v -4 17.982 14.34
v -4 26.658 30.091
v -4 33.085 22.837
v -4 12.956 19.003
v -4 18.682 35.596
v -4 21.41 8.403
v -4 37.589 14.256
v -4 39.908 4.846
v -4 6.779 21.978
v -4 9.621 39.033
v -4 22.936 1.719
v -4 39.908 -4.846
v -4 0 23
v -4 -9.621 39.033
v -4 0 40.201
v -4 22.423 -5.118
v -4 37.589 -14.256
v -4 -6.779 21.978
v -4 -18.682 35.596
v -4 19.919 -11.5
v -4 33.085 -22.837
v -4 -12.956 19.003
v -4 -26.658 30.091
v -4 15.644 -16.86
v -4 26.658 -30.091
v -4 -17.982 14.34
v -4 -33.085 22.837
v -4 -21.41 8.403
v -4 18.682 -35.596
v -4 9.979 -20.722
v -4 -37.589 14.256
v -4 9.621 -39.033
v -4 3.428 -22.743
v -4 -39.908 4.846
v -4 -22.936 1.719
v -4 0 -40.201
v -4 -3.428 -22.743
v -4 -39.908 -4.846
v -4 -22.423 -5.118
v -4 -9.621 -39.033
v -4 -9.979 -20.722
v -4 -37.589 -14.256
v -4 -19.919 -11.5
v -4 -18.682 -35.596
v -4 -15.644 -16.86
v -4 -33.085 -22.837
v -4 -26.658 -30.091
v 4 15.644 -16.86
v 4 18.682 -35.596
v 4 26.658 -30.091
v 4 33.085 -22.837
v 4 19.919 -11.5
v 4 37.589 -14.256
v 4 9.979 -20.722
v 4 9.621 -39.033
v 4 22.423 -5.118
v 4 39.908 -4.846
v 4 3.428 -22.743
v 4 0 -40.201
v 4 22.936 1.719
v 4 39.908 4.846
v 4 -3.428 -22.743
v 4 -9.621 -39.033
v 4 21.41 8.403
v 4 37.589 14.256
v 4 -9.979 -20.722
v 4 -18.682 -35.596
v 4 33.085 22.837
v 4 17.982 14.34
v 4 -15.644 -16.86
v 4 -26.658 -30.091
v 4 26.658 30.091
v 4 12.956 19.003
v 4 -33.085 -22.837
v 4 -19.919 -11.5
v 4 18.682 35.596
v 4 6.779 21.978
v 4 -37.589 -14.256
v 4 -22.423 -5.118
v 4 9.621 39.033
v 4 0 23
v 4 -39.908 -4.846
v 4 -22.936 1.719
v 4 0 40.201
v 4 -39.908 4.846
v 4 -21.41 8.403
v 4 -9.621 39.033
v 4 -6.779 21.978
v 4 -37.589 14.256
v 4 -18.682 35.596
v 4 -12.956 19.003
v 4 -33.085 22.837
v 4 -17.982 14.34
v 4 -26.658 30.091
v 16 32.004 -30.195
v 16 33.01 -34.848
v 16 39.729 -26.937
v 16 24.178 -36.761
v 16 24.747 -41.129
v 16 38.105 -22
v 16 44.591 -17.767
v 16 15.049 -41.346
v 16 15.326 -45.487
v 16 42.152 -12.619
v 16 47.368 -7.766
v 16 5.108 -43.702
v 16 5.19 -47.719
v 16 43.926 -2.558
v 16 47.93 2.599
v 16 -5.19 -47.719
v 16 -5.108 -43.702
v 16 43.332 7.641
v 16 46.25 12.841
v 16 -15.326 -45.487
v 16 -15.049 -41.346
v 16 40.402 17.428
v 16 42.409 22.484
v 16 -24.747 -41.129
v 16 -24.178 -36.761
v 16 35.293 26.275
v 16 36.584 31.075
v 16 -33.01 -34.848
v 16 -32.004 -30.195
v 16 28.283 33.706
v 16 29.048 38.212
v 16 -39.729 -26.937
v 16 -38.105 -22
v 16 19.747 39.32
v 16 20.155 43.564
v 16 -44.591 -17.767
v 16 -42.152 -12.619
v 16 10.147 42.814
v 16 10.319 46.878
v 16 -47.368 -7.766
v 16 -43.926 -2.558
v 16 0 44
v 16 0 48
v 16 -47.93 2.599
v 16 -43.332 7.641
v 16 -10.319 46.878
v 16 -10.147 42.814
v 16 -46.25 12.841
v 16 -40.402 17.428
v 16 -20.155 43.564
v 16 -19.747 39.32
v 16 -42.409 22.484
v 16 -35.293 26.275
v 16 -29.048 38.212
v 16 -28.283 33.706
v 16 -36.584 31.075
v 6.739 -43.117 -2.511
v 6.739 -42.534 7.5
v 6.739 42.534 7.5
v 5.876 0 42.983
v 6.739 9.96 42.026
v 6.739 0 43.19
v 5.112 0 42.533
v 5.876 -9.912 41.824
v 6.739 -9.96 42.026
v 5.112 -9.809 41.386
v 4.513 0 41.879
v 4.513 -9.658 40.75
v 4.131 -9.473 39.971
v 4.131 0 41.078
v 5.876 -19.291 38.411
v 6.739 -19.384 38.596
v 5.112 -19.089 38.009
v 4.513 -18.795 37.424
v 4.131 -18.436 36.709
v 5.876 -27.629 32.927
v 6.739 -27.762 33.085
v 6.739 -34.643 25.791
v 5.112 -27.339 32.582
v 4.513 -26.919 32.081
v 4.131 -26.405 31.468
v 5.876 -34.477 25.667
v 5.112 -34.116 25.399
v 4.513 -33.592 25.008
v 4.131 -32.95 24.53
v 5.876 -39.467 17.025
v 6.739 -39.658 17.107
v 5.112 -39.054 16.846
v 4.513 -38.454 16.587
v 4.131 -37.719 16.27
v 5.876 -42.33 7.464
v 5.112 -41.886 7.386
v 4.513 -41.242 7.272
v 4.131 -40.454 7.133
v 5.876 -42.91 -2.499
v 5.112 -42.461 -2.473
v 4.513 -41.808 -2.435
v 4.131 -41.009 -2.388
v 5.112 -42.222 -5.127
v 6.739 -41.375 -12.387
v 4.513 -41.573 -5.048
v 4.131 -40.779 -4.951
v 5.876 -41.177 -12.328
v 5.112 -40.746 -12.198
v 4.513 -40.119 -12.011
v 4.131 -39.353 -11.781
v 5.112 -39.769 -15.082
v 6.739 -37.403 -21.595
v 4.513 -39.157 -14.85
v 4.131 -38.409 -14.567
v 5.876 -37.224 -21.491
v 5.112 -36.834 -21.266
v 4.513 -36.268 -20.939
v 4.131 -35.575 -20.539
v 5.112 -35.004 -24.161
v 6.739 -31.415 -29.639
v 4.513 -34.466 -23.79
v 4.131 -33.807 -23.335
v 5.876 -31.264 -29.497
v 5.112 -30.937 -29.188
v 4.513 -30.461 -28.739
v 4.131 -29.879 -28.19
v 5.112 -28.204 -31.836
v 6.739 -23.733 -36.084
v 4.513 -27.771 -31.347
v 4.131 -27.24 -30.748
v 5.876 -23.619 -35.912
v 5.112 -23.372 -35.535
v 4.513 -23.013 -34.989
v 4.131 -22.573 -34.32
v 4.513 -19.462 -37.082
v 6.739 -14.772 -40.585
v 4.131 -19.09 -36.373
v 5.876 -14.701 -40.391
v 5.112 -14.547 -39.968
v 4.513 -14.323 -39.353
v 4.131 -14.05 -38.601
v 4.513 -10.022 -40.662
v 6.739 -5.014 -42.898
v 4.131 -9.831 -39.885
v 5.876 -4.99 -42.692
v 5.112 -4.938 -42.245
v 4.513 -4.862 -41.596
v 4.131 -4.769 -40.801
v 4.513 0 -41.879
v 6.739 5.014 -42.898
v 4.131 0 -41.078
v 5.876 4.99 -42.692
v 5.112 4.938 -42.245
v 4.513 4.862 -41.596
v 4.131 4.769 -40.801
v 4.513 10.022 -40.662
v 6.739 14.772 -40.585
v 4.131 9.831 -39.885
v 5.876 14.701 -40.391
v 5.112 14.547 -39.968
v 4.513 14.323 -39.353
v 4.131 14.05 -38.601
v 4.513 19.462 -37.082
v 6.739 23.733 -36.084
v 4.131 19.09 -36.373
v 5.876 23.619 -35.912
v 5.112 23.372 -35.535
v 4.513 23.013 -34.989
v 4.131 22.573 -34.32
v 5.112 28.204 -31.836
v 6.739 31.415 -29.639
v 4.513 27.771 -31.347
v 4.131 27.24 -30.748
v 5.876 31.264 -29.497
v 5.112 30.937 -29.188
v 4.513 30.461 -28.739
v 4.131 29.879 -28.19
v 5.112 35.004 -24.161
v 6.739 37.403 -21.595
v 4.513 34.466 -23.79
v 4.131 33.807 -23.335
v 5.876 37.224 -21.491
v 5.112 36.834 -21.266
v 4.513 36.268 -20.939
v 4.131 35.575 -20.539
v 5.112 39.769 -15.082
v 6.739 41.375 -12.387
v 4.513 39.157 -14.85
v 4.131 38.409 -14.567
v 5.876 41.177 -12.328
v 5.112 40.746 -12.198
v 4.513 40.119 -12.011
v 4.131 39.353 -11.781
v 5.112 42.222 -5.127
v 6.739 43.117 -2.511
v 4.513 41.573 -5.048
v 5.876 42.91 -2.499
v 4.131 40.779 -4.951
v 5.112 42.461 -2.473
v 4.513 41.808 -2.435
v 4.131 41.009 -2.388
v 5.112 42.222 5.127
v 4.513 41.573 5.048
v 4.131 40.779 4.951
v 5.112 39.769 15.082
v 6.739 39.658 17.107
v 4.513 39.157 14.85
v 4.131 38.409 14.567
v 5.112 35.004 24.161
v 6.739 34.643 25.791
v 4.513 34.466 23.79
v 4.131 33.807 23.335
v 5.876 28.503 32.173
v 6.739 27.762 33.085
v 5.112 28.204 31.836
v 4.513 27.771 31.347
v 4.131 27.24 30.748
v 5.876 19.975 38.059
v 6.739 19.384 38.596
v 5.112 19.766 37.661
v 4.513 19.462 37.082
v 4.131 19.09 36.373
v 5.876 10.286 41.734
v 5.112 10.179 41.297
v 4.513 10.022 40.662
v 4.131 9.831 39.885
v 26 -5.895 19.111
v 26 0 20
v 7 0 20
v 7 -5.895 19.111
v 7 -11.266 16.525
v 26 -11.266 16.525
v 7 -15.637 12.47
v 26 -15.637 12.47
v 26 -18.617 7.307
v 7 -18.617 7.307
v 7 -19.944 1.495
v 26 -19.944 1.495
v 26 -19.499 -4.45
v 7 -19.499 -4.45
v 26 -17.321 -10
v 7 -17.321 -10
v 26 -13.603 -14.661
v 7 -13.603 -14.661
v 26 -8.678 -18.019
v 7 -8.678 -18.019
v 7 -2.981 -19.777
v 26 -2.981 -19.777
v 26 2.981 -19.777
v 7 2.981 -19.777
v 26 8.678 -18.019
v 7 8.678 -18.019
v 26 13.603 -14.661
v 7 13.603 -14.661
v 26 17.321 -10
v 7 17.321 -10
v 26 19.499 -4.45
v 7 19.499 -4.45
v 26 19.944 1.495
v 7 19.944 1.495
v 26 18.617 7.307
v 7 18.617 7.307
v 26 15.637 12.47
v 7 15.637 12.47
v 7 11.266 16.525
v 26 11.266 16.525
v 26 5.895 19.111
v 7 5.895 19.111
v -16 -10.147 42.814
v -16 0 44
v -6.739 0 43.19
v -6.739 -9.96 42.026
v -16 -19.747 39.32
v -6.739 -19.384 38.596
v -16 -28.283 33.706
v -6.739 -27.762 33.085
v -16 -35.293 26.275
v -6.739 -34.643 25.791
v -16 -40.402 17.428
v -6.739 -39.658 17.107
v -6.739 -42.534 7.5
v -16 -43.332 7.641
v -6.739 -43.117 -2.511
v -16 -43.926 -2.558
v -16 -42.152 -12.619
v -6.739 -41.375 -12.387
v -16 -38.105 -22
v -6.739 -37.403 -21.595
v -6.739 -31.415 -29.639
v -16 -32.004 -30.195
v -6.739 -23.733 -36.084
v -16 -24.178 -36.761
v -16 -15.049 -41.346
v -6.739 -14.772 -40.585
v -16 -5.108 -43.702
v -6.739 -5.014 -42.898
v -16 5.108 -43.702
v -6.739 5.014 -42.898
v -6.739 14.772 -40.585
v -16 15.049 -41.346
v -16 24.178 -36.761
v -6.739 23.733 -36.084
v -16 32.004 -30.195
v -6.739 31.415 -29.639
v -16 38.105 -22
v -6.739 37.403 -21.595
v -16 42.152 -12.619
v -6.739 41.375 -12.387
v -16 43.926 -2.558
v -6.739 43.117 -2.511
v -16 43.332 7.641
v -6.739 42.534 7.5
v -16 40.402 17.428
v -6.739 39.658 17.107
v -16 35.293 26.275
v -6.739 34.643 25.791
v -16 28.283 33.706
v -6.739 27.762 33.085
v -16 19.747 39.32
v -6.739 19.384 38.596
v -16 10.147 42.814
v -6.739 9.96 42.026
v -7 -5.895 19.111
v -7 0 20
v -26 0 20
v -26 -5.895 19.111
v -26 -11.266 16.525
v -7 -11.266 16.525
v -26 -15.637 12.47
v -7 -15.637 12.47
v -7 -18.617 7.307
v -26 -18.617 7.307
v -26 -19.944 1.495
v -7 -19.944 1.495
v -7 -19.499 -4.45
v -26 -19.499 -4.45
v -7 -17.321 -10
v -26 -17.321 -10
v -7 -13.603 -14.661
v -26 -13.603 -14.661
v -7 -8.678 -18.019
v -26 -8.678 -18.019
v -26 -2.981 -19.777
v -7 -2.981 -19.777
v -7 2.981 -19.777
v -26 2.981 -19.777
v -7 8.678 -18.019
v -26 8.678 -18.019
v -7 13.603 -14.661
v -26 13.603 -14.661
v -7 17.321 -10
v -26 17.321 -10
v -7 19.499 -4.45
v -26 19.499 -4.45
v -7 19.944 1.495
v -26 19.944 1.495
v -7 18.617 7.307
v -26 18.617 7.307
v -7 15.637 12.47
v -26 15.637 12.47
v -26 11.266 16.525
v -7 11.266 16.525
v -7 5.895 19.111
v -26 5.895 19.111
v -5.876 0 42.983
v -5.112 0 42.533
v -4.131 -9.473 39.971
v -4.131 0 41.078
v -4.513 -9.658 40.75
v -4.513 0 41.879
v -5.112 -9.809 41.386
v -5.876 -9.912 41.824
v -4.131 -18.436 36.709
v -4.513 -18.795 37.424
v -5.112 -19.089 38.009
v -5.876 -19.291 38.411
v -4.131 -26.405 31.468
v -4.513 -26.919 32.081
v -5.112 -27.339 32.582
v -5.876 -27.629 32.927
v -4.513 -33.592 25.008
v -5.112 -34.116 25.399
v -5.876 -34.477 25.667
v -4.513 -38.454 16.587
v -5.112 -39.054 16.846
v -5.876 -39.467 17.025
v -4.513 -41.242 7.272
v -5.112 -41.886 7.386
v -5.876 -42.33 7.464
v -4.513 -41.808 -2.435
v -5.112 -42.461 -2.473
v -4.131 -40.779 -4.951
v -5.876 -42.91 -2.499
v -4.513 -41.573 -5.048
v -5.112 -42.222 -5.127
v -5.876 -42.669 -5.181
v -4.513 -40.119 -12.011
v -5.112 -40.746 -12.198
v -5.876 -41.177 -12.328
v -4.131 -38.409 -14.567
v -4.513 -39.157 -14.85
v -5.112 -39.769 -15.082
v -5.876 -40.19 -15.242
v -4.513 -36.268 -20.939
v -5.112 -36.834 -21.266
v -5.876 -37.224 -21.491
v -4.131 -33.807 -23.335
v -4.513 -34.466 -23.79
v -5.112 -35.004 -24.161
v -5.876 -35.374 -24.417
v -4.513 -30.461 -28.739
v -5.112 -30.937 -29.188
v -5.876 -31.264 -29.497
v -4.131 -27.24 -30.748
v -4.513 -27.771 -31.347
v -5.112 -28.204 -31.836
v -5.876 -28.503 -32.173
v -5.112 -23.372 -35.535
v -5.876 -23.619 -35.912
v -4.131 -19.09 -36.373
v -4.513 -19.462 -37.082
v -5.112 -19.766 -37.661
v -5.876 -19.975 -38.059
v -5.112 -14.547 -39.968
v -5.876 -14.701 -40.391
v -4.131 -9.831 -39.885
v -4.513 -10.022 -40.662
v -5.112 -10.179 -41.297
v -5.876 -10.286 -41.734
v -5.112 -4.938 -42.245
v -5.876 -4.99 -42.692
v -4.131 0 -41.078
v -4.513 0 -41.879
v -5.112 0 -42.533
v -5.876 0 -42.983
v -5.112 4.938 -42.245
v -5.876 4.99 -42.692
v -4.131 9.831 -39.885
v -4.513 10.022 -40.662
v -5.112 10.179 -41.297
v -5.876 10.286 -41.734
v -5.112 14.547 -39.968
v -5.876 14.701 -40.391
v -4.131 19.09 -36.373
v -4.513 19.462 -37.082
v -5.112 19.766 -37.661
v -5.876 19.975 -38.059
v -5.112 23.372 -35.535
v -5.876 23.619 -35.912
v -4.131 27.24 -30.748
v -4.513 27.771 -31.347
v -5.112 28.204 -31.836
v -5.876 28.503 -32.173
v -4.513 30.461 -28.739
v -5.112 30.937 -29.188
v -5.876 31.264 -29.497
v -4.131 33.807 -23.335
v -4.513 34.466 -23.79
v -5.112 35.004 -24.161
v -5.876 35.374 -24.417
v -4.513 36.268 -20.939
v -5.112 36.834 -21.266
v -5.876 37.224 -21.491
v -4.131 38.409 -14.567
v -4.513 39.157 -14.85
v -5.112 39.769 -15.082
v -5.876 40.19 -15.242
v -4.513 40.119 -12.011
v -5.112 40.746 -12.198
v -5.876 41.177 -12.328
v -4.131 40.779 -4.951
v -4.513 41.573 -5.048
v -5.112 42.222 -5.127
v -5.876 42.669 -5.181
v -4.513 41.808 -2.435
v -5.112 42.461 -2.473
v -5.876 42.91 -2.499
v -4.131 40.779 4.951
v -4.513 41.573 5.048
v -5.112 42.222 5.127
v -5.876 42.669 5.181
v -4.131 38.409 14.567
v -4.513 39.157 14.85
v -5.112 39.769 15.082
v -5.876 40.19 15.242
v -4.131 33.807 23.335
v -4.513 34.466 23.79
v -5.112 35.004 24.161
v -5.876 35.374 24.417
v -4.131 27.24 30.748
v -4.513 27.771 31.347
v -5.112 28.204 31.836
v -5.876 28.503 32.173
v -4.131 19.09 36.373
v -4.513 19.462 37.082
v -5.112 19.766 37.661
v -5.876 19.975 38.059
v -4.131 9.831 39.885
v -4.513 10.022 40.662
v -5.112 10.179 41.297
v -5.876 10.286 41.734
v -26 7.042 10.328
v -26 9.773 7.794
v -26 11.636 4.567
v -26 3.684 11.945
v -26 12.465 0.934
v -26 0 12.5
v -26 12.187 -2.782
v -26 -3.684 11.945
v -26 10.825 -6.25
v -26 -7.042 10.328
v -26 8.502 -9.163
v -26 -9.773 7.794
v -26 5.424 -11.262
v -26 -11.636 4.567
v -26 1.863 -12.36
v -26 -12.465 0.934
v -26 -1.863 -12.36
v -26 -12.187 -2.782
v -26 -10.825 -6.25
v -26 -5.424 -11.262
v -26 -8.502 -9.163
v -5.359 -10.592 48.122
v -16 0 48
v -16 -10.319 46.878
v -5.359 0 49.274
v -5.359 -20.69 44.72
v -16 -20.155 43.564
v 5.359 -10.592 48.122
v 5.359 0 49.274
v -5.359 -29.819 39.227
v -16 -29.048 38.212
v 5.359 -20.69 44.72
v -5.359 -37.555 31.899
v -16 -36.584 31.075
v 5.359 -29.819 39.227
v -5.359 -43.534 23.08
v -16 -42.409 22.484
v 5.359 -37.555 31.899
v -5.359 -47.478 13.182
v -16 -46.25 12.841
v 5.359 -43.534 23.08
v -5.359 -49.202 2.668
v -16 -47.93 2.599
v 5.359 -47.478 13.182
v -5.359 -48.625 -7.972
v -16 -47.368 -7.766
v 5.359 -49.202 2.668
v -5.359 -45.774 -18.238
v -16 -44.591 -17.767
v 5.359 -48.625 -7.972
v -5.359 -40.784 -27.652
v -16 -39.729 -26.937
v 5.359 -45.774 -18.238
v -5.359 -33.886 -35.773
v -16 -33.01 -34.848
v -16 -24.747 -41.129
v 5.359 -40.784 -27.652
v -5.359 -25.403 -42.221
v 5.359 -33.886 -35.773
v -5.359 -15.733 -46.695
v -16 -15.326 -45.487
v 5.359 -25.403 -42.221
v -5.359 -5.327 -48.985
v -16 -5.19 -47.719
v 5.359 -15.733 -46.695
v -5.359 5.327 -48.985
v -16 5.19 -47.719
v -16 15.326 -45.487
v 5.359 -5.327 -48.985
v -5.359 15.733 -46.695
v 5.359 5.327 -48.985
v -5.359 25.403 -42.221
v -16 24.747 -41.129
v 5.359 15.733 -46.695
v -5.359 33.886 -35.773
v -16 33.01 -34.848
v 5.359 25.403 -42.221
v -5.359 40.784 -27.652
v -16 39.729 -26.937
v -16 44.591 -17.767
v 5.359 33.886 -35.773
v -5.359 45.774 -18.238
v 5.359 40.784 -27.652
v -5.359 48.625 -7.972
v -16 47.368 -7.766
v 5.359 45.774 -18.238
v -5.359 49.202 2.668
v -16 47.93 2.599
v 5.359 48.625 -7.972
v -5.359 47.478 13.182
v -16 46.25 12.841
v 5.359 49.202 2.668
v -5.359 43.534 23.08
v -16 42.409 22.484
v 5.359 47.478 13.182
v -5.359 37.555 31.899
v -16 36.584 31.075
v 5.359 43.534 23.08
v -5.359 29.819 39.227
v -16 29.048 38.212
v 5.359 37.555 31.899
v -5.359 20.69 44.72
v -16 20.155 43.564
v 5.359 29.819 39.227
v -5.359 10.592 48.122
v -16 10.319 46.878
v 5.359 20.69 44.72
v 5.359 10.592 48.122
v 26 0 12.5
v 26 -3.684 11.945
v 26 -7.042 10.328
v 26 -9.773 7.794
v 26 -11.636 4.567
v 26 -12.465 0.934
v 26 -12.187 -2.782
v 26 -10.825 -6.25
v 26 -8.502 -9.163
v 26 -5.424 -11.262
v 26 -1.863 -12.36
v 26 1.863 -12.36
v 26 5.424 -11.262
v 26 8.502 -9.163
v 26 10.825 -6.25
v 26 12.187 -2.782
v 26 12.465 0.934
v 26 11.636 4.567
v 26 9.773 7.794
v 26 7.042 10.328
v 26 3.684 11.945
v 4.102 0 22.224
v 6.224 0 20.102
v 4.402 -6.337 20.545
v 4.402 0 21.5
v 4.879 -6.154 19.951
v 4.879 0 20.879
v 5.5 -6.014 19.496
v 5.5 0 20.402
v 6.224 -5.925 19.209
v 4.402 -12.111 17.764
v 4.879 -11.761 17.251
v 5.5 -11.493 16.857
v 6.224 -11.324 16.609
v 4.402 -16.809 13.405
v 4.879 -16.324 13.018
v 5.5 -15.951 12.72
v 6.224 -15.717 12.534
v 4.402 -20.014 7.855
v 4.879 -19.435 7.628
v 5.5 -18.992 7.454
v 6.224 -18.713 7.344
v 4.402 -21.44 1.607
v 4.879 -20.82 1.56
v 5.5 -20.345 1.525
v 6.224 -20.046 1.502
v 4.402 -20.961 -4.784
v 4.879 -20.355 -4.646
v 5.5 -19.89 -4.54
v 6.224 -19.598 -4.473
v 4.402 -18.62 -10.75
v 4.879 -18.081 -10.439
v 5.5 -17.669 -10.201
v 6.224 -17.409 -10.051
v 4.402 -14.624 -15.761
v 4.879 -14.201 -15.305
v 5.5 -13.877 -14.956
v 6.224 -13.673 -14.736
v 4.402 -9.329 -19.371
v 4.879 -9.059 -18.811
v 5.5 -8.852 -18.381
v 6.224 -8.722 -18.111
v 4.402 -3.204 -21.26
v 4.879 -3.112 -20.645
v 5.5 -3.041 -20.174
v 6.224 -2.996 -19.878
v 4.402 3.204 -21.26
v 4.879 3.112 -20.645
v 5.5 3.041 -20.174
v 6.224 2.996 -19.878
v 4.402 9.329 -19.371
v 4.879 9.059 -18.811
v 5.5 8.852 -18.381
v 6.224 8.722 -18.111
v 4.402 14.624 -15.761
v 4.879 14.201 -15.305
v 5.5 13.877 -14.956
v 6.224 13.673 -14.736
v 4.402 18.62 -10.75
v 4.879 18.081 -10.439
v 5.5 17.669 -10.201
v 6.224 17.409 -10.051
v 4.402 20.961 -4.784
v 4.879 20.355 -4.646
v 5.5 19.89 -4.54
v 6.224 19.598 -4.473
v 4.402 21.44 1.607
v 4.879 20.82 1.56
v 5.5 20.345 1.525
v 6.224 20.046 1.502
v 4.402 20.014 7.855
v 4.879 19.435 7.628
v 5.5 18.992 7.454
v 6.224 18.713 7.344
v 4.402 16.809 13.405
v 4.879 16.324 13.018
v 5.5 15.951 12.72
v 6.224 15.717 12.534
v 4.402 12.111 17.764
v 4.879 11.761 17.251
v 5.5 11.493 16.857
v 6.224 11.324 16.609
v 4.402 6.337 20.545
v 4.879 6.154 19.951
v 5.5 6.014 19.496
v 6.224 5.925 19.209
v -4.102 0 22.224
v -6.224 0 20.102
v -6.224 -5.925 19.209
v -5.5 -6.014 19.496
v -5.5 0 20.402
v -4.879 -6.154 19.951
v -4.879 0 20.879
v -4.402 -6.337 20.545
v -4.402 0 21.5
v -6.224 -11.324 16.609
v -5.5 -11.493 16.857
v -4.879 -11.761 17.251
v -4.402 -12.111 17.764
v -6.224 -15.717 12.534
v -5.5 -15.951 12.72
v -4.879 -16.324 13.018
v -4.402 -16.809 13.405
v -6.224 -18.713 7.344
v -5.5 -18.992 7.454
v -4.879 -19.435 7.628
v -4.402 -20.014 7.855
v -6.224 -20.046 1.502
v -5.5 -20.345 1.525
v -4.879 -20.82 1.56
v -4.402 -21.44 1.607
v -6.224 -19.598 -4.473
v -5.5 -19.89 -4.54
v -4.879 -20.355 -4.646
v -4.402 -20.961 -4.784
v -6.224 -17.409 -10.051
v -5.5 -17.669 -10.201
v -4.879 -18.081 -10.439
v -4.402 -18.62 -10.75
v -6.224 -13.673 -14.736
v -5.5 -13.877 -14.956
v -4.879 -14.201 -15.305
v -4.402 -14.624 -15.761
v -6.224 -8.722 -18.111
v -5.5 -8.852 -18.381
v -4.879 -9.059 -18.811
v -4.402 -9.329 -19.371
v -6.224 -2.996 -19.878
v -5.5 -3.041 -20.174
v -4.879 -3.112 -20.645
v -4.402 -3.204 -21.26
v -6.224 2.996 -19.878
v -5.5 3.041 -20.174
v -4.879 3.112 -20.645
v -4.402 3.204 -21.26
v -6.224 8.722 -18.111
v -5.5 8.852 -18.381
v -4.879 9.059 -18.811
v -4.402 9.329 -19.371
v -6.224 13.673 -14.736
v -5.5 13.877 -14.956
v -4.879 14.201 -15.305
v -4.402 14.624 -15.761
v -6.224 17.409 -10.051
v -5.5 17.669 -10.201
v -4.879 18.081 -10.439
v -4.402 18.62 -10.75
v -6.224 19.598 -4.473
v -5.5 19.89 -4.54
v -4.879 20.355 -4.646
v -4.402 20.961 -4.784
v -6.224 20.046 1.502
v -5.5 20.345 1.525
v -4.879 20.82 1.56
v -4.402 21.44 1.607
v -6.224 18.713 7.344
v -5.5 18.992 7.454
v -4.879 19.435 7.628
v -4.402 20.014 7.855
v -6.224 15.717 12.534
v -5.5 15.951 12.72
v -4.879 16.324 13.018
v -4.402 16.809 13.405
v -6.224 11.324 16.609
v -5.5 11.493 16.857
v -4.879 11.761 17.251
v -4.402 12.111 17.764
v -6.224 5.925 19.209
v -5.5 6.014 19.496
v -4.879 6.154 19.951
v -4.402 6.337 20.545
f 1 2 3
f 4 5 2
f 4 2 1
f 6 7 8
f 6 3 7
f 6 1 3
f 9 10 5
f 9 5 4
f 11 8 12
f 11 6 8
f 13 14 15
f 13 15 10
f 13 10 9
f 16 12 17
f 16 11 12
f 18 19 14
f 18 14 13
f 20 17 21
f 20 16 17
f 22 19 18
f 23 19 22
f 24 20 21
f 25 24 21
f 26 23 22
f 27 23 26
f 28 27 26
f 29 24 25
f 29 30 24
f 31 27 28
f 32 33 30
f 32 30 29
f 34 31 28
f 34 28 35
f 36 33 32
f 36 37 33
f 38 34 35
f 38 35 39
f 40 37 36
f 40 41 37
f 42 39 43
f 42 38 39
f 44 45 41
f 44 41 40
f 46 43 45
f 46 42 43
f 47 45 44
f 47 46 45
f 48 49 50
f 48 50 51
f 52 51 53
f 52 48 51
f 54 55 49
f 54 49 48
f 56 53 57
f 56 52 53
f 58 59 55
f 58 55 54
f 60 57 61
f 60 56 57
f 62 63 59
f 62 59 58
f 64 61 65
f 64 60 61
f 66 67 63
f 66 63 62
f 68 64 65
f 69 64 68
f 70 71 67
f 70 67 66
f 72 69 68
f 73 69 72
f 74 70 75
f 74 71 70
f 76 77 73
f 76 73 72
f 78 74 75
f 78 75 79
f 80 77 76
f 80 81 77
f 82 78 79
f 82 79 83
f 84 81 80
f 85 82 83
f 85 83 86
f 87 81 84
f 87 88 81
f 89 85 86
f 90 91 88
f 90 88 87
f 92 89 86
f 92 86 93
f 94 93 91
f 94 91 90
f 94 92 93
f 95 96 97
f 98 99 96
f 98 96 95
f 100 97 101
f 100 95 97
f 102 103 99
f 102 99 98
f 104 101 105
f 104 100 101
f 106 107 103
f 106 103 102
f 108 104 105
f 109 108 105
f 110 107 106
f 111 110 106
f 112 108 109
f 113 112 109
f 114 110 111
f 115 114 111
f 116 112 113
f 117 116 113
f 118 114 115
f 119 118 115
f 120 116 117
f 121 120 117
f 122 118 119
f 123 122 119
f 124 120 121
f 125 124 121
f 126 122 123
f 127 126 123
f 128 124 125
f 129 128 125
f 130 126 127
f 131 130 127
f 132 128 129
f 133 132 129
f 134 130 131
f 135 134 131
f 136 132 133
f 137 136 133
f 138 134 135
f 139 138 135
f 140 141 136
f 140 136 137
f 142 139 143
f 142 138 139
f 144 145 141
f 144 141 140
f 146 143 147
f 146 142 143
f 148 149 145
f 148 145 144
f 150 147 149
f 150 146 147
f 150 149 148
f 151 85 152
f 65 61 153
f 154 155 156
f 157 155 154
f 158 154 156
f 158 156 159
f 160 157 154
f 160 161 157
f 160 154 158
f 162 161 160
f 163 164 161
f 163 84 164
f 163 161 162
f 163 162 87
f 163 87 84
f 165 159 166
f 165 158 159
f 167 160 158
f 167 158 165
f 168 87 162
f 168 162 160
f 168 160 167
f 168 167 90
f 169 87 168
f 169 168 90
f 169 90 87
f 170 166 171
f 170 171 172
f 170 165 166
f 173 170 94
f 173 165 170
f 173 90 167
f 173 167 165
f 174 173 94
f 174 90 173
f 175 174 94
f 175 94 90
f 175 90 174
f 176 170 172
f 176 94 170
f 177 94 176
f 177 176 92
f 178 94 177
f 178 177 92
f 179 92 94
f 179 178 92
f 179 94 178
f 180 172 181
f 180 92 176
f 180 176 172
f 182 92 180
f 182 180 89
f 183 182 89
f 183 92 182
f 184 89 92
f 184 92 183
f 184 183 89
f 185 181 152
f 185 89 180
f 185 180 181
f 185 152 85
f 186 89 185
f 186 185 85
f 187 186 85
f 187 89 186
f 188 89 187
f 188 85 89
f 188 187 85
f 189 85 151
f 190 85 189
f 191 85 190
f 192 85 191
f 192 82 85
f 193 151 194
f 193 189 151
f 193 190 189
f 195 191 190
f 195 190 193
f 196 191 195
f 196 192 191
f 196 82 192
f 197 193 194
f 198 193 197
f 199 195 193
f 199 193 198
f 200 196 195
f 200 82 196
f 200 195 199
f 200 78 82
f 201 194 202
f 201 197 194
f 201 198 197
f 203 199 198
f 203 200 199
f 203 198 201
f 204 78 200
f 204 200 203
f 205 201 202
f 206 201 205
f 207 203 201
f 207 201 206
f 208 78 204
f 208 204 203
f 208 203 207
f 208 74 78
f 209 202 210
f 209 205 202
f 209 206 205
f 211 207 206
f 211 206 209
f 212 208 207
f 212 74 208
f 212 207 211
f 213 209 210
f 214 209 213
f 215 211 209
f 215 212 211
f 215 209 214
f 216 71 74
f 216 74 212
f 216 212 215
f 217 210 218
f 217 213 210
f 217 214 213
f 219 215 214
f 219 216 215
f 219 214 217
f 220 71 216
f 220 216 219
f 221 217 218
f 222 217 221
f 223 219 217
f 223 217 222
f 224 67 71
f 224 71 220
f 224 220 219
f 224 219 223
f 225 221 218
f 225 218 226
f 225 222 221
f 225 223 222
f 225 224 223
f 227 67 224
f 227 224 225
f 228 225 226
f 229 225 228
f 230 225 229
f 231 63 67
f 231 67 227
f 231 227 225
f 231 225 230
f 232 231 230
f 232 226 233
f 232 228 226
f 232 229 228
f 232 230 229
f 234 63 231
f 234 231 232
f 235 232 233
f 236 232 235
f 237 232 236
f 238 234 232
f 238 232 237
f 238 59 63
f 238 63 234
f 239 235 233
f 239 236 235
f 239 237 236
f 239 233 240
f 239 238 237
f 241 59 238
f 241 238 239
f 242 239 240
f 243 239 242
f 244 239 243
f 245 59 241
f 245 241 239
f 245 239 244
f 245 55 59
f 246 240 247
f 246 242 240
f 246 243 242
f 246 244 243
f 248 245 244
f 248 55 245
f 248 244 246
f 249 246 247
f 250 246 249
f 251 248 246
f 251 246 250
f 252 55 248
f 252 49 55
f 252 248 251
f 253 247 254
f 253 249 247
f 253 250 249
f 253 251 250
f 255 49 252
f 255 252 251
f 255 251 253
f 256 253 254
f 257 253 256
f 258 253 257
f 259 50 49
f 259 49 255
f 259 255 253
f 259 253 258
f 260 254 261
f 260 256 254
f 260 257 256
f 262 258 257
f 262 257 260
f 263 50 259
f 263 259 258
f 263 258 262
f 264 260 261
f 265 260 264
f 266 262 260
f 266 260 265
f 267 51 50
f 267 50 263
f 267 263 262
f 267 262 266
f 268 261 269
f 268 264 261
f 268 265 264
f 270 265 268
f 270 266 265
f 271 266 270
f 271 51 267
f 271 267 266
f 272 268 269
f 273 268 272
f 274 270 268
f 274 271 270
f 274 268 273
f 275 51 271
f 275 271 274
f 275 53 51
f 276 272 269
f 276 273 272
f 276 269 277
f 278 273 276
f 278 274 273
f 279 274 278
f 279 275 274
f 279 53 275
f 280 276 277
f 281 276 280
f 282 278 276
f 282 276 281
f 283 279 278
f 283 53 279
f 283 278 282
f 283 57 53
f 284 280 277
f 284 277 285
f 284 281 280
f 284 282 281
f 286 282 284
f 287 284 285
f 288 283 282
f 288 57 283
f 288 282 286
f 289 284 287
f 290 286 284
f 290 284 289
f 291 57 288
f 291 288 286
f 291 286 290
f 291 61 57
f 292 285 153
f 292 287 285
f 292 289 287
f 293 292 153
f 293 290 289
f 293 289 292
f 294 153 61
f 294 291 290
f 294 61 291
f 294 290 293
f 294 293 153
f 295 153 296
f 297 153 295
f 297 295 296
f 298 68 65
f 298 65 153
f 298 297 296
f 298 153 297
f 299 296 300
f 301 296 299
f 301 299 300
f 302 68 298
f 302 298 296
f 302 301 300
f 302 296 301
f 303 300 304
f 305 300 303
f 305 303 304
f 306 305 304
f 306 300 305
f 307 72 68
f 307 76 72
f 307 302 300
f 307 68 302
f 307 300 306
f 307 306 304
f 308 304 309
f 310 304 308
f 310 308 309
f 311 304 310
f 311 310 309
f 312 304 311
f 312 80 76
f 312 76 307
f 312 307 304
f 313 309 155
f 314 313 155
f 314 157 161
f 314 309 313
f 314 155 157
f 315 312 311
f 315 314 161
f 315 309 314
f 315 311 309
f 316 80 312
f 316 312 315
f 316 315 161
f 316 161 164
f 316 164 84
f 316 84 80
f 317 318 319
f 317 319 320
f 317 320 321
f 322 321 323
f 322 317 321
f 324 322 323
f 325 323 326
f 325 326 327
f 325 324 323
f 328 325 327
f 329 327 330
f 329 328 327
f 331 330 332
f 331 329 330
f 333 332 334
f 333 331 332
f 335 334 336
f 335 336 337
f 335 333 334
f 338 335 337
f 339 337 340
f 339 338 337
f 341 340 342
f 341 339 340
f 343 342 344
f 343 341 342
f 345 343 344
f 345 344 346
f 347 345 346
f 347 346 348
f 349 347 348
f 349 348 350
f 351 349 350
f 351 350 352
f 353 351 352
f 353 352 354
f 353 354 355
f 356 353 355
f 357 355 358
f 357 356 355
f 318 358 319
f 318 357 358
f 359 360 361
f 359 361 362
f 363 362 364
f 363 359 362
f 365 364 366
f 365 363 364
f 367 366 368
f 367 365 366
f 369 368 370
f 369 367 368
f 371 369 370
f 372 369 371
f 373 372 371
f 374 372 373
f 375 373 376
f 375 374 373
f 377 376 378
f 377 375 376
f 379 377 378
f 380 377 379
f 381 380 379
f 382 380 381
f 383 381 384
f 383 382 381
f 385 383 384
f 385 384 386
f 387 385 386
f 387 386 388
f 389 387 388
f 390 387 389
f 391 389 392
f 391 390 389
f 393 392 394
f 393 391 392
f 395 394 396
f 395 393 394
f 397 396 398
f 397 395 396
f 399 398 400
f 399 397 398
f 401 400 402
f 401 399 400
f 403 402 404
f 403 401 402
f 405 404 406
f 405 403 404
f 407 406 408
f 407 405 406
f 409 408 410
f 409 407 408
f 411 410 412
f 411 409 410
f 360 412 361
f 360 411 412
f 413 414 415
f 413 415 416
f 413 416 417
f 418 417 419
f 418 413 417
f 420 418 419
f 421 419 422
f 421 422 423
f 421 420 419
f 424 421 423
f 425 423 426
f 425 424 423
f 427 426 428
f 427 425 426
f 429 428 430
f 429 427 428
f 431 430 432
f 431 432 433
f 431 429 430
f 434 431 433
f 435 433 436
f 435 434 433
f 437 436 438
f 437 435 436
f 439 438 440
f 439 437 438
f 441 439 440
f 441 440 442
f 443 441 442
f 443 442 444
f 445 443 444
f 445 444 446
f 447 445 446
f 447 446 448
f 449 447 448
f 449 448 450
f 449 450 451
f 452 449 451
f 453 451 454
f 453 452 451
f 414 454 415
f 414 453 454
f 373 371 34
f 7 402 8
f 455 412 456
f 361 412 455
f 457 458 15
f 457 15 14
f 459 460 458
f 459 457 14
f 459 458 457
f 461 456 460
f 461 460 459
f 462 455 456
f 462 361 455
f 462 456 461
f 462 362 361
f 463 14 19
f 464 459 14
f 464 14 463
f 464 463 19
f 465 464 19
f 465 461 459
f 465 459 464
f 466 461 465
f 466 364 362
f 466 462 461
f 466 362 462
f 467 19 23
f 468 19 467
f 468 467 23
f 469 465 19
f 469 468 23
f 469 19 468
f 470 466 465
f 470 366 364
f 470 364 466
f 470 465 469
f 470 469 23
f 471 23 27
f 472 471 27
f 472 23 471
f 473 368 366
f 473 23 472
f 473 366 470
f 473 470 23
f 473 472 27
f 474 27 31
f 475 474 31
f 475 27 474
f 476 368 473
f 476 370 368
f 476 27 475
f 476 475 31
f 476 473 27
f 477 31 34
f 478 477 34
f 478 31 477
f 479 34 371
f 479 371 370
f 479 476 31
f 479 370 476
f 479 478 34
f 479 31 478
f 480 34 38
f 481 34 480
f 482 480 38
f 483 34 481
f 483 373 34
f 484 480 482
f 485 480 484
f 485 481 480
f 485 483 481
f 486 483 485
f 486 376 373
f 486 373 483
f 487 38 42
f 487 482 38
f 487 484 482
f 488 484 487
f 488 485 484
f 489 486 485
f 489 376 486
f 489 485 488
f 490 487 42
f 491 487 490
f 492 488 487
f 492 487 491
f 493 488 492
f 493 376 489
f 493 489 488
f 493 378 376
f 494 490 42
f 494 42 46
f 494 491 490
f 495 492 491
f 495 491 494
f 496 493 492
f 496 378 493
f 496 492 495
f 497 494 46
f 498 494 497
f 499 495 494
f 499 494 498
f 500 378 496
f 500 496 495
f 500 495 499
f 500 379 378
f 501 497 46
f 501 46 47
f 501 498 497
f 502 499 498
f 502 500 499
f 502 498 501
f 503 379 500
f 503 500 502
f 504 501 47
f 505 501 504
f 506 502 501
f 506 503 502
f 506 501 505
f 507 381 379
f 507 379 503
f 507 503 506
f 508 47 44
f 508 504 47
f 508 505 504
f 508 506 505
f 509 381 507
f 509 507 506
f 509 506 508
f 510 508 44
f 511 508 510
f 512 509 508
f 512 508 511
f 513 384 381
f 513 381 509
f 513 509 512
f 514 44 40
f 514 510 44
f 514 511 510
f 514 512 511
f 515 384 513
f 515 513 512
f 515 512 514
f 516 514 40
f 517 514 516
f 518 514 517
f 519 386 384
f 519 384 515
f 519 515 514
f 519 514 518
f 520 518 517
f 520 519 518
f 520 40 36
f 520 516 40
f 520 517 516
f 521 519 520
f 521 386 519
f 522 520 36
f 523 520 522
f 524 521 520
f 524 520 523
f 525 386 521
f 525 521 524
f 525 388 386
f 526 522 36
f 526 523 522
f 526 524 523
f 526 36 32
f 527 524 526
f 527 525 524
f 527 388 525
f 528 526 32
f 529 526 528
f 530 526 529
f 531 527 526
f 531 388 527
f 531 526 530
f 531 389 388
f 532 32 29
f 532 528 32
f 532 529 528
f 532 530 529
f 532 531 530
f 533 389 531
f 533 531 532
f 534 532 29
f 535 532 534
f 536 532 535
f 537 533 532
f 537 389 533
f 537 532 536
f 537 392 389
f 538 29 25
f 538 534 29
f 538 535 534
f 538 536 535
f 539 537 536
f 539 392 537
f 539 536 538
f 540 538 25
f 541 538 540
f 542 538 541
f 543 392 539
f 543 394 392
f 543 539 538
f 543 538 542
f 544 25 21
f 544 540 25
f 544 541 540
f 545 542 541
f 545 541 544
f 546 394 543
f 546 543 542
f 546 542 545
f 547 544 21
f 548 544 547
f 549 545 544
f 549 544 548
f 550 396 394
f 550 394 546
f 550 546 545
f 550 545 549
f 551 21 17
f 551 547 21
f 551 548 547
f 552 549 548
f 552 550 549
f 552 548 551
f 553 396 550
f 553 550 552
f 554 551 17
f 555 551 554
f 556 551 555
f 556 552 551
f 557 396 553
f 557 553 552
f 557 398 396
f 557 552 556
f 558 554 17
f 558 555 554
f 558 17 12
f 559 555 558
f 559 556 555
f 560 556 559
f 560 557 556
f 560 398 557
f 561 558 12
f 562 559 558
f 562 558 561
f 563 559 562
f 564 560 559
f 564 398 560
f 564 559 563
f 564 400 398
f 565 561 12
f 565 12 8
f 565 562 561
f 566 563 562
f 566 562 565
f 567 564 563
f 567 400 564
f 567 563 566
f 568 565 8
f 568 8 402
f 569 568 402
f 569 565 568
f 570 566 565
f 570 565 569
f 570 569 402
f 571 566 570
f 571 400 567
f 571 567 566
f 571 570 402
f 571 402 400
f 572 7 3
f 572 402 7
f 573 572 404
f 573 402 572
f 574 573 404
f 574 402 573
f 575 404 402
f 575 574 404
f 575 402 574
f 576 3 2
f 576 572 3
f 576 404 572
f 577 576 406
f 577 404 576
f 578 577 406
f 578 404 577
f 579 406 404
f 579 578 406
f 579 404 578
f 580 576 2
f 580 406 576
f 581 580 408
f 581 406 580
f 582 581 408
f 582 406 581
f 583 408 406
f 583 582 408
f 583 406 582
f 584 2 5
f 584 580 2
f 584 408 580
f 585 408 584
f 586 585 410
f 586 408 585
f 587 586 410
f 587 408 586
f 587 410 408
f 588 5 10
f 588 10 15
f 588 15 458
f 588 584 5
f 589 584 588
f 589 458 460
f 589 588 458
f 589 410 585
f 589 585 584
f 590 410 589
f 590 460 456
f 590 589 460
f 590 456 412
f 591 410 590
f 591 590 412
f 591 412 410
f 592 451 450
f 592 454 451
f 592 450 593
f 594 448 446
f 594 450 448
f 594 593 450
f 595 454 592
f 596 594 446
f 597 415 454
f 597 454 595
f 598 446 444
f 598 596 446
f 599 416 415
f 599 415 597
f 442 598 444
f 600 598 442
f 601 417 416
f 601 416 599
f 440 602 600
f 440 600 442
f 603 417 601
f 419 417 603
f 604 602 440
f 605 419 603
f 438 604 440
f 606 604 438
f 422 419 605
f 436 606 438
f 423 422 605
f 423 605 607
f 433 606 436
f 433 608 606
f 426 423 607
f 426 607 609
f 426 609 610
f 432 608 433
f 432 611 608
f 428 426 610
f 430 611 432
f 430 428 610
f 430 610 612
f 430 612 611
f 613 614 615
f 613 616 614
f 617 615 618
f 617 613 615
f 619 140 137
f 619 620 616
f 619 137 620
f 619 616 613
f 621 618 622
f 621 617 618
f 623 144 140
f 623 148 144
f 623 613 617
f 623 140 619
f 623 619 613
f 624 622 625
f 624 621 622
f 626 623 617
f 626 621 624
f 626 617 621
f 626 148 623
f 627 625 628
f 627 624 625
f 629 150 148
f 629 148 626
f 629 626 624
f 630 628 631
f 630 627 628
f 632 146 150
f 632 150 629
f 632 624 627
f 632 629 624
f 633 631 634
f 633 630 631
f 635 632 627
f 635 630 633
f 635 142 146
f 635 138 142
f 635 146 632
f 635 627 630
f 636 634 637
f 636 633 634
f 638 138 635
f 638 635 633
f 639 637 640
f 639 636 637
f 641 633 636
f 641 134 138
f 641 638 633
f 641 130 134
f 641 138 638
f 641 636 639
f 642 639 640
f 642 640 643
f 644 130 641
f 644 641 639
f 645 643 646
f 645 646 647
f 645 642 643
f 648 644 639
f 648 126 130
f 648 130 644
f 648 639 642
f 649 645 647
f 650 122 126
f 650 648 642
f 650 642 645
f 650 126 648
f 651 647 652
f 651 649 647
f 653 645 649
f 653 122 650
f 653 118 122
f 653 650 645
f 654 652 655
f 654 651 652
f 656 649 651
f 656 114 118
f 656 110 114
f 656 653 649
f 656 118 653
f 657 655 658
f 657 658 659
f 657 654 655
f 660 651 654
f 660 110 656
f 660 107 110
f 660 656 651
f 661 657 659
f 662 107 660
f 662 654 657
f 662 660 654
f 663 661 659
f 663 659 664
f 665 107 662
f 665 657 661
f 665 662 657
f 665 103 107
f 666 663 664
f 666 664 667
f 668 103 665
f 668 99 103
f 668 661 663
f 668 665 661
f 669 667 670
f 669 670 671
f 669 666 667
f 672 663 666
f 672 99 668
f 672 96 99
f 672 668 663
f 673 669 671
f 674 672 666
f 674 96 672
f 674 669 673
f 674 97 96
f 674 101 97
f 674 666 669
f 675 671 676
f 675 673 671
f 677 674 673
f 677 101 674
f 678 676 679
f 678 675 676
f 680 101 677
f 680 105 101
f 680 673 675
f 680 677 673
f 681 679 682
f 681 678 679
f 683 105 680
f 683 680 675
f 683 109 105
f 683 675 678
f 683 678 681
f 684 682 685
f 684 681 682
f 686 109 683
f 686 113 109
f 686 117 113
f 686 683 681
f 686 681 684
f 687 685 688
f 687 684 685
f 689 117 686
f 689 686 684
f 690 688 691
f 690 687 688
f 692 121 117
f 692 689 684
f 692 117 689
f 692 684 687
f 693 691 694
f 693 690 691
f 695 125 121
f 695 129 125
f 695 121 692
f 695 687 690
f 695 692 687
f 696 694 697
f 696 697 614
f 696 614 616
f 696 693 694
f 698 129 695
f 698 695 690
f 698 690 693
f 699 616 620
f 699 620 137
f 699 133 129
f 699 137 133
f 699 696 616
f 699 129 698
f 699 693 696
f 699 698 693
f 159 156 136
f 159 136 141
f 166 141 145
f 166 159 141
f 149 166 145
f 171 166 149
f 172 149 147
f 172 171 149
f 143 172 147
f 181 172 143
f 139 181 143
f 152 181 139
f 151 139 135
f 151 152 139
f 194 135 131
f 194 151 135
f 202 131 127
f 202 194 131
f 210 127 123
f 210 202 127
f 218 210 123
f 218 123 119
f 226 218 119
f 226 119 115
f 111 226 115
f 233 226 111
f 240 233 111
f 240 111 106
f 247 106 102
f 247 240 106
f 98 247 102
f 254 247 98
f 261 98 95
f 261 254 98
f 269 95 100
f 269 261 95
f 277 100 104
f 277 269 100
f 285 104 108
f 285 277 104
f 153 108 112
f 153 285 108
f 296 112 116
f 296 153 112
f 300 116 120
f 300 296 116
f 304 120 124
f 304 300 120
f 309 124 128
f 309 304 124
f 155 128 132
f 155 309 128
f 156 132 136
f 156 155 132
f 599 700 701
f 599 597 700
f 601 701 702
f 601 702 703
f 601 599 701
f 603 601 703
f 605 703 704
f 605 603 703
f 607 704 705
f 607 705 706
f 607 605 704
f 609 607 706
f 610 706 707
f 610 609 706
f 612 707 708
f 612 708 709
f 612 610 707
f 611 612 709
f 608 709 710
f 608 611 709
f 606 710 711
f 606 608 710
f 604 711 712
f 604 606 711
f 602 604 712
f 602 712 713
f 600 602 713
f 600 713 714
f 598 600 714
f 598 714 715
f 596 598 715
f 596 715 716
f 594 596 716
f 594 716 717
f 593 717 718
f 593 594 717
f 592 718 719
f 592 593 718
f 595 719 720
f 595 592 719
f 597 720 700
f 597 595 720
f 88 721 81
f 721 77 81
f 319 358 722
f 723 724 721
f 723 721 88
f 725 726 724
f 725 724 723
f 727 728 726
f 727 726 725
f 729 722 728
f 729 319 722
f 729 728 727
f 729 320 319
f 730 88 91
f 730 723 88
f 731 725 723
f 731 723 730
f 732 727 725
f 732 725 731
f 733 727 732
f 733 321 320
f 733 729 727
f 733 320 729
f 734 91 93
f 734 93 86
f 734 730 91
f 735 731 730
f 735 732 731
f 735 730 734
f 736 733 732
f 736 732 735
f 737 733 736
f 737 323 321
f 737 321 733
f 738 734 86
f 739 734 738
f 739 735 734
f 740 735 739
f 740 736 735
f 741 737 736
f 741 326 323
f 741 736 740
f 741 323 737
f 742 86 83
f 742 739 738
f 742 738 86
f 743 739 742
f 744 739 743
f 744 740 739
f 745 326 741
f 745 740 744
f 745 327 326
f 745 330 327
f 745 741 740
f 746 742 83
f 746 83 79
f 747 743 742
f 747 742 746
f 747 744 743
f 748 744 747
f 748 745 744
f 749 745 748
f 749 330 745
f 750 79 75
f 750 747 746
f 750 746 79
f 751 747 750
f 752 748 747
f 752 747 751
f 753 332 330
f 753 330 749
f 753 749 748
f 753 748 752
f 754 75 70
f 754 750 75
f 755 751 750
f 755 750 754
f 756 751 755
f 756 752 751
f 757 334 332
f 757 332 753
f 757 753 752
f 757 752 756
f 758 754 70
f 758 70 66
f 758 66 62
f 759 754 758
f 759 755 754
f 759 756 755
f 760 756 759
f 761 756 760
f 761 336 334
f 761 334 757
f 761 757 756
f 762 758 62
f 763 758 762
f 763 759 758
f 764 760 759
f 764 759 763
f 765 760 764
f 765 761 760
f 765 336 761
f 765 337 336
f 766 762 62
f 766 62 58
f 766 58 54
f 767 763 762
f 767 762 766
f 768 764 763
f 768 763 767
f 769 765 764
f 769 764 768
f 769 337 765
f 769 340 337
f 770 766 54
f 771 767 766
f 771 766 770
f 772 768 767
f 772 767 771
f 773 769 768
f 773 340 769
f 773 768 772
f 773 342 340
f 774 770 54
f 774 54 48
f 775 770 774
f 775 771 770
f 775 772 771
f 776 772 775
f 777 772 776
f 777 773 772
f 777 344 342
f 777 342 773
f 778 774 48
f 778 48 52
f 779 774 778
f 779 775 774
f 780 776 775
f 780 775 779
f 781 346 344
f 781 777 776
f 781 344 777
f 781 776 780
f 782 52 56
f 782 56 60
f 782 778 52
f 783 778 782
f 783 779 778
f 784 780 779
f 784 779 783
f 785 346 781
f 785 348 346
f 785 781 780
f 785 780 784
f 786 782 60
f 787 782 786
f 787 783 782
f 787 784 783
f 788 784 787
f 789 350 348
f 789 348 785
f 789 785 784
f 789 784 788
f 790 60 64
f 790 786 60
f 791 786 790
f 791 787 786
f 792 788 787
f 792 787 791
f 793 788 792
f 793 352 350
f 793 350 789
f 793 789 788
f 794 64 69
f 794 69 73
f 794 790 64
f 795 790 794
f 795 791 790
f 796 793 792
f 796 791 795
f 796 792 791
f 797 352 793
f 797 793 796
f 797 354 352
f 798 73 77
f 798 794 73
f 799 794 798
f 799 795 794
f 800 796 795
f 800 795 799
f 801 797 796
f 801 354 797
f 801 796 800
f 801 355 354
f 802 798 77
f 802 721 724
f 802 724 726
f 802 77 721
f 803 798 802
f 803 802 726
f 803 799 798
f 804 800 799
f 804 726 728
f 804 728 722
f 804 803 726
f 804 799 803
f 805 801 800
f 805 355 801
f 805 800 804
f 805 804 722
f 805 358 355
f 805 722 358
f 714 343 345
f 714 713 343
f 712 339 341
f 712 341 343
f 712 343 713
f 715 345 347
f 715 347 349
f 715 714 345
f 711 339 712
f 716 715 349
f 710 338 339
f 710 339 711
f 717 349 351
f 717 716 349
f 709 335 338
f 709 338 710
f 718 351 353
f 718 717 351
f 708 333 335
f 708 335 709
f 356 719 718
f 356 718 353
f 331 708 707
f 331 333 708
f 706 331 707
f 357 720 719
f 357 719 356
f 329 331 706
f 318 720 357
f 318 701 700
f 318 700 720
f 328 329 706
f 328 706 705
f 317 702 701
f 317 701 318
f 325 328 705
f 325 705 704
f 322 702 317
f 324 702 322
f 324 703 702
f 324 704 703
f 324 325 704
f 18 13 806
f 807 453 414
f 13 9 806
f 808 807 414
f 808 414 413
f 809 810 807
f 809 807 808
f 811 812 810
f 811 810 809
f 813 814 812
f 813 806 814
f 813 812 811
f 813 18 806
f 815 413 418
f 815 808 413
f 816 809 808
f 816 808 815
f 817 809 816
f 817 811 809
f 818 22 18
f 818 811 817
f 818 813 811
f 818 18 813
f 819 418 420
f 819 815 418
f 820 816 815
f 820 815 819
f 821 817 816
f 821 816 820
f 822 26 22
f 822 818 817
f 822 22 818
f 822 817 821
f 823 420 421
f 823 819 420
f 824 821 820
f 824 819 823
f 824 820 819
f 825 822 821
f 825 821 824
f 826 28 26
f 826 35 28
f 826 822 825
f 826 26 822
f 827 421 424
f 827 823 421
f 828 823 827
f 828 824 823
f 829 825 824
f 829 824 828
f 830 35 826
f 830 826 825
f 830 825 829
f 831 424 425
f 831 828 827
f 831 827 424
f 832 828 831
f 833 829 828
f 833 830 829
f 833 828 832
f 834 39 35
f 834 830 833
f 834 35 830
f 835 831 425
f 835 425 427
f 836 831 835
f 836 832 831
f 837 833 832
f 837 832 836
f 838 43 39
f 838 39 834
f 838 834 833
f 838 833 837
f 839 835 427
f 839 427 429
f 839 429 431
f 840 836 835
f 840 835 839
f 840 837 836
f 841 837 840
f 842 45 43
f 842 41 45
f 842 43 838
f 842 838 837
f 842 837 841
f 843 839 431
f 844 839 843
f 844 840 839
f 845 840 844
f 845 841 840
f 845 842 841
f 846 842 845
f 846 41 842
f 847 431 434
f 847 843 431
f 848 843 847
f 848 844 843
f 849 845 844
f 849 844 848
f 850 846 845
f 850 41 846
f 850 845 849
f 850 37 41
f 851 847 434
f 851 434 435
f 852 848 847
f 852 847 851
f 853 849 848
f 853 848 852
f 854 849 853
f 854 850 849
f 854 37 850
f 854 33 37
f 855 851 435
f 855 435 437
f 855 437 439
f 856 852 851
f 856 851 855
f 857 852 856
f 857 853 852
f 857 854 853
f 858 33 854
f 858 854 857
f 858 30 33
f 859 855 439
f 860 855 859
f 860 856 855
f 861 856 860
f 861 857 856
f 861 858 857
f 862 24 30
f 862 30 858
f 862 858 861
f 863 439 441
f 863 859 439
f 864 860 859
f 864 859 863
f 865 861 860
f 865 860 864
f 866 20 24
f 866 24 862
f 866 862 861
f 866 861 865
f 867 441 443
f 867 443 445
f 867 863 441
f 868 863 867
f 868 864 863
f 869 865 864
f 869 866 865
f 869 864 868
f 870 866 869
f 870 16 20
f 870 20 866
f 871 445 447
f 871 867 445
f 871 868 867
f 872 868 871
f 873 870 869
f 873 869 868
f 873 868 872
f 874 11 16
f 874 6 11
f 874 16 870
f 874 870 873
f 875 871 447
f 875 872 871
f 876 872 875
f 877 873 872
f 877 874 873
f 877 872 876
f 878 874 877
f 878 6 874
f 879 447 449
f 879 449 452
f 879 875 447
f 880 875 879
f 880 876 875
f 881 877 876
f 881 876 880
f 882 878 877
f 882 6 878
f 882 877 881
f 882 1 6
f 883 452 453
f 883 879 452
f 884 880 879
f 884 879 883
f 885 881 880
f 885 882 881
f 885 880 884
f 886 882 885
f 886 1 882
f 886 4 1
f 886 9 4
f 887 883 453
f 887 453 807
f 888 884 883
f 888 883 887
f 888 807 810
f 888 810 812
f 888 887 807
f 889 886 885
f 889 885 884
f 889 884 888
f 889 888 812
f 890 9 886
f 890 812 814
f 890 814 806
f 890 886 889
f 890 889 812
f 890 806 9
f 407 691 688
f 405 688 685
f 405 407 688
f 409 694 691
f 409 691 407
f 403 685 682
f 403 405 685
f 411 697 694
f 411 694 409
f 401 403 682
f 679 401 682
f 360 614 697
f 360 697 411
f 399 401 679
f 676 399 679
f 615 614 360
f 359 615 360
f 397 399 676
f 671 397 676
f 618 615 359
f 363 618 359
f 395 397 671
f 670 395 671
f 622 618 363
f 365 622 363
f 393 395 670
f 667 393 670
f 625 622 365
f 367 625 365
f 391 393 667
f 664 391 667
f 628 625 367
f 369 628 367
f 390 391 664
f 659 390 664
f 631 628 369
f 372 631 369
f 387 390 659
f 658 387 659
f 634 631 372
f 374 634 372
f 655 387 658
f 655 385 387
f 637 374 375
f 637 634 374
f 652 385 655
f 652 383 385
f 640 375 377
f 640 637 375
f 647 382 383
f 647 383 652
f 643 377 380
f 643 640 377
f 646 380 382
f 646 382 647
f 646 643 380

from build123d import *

# Parameters (mm, degrees)
RACCORDO4_R = 3


with BuildPart() as part:
    # Schizzo2 → Rivoluzione1 (revolve)
    with BuildSketch(Plane.XY, mode=Mode.PRIVATE) as rivoluzione1_sk:
        with BuildLine():
            Line((26, 12.5), (-26, 12.5))
            Line((-26, 12.5), (-26, 20))
            Line((-26, 20), (-4, 20))
            Line((-4, 20), (-4, 42.950136038))
            Line((-4, 42.950136038), (-16, 44))
            Line((-16, 44), (-16, 48))
            ThreePointArc((-16, 48), (0, 49.433640698), (16, 48))
            Line((16, 48), (16, 44))
            Line((16, 44), (4, 42.950136038))
            Line((4, 42.950136038), (4, 20))
            Line((4, 20), (26, 20))
            Line((26, 20), (26, 12.5))
        make_face()
    revolve(rivoluzione1_sk.sketch.rotate(Axis((0, 0, 0), (1, 0, 0)), 90), axis=Axis((0, 0, 0), (1, 0, 0)))

    # Raccordo4
    raccordo4_edges = [part.edges().sort_by_distance(p)[0] for p in [
        (4, 0, -42.950136038),
        (-4, 0, -42.950136038),
        (-4, 0, -20),
        (4, 0, -20),
    ]]
    fillet(raccordo4_edges, radius=RACCORDO4_R)


solid = part.part
